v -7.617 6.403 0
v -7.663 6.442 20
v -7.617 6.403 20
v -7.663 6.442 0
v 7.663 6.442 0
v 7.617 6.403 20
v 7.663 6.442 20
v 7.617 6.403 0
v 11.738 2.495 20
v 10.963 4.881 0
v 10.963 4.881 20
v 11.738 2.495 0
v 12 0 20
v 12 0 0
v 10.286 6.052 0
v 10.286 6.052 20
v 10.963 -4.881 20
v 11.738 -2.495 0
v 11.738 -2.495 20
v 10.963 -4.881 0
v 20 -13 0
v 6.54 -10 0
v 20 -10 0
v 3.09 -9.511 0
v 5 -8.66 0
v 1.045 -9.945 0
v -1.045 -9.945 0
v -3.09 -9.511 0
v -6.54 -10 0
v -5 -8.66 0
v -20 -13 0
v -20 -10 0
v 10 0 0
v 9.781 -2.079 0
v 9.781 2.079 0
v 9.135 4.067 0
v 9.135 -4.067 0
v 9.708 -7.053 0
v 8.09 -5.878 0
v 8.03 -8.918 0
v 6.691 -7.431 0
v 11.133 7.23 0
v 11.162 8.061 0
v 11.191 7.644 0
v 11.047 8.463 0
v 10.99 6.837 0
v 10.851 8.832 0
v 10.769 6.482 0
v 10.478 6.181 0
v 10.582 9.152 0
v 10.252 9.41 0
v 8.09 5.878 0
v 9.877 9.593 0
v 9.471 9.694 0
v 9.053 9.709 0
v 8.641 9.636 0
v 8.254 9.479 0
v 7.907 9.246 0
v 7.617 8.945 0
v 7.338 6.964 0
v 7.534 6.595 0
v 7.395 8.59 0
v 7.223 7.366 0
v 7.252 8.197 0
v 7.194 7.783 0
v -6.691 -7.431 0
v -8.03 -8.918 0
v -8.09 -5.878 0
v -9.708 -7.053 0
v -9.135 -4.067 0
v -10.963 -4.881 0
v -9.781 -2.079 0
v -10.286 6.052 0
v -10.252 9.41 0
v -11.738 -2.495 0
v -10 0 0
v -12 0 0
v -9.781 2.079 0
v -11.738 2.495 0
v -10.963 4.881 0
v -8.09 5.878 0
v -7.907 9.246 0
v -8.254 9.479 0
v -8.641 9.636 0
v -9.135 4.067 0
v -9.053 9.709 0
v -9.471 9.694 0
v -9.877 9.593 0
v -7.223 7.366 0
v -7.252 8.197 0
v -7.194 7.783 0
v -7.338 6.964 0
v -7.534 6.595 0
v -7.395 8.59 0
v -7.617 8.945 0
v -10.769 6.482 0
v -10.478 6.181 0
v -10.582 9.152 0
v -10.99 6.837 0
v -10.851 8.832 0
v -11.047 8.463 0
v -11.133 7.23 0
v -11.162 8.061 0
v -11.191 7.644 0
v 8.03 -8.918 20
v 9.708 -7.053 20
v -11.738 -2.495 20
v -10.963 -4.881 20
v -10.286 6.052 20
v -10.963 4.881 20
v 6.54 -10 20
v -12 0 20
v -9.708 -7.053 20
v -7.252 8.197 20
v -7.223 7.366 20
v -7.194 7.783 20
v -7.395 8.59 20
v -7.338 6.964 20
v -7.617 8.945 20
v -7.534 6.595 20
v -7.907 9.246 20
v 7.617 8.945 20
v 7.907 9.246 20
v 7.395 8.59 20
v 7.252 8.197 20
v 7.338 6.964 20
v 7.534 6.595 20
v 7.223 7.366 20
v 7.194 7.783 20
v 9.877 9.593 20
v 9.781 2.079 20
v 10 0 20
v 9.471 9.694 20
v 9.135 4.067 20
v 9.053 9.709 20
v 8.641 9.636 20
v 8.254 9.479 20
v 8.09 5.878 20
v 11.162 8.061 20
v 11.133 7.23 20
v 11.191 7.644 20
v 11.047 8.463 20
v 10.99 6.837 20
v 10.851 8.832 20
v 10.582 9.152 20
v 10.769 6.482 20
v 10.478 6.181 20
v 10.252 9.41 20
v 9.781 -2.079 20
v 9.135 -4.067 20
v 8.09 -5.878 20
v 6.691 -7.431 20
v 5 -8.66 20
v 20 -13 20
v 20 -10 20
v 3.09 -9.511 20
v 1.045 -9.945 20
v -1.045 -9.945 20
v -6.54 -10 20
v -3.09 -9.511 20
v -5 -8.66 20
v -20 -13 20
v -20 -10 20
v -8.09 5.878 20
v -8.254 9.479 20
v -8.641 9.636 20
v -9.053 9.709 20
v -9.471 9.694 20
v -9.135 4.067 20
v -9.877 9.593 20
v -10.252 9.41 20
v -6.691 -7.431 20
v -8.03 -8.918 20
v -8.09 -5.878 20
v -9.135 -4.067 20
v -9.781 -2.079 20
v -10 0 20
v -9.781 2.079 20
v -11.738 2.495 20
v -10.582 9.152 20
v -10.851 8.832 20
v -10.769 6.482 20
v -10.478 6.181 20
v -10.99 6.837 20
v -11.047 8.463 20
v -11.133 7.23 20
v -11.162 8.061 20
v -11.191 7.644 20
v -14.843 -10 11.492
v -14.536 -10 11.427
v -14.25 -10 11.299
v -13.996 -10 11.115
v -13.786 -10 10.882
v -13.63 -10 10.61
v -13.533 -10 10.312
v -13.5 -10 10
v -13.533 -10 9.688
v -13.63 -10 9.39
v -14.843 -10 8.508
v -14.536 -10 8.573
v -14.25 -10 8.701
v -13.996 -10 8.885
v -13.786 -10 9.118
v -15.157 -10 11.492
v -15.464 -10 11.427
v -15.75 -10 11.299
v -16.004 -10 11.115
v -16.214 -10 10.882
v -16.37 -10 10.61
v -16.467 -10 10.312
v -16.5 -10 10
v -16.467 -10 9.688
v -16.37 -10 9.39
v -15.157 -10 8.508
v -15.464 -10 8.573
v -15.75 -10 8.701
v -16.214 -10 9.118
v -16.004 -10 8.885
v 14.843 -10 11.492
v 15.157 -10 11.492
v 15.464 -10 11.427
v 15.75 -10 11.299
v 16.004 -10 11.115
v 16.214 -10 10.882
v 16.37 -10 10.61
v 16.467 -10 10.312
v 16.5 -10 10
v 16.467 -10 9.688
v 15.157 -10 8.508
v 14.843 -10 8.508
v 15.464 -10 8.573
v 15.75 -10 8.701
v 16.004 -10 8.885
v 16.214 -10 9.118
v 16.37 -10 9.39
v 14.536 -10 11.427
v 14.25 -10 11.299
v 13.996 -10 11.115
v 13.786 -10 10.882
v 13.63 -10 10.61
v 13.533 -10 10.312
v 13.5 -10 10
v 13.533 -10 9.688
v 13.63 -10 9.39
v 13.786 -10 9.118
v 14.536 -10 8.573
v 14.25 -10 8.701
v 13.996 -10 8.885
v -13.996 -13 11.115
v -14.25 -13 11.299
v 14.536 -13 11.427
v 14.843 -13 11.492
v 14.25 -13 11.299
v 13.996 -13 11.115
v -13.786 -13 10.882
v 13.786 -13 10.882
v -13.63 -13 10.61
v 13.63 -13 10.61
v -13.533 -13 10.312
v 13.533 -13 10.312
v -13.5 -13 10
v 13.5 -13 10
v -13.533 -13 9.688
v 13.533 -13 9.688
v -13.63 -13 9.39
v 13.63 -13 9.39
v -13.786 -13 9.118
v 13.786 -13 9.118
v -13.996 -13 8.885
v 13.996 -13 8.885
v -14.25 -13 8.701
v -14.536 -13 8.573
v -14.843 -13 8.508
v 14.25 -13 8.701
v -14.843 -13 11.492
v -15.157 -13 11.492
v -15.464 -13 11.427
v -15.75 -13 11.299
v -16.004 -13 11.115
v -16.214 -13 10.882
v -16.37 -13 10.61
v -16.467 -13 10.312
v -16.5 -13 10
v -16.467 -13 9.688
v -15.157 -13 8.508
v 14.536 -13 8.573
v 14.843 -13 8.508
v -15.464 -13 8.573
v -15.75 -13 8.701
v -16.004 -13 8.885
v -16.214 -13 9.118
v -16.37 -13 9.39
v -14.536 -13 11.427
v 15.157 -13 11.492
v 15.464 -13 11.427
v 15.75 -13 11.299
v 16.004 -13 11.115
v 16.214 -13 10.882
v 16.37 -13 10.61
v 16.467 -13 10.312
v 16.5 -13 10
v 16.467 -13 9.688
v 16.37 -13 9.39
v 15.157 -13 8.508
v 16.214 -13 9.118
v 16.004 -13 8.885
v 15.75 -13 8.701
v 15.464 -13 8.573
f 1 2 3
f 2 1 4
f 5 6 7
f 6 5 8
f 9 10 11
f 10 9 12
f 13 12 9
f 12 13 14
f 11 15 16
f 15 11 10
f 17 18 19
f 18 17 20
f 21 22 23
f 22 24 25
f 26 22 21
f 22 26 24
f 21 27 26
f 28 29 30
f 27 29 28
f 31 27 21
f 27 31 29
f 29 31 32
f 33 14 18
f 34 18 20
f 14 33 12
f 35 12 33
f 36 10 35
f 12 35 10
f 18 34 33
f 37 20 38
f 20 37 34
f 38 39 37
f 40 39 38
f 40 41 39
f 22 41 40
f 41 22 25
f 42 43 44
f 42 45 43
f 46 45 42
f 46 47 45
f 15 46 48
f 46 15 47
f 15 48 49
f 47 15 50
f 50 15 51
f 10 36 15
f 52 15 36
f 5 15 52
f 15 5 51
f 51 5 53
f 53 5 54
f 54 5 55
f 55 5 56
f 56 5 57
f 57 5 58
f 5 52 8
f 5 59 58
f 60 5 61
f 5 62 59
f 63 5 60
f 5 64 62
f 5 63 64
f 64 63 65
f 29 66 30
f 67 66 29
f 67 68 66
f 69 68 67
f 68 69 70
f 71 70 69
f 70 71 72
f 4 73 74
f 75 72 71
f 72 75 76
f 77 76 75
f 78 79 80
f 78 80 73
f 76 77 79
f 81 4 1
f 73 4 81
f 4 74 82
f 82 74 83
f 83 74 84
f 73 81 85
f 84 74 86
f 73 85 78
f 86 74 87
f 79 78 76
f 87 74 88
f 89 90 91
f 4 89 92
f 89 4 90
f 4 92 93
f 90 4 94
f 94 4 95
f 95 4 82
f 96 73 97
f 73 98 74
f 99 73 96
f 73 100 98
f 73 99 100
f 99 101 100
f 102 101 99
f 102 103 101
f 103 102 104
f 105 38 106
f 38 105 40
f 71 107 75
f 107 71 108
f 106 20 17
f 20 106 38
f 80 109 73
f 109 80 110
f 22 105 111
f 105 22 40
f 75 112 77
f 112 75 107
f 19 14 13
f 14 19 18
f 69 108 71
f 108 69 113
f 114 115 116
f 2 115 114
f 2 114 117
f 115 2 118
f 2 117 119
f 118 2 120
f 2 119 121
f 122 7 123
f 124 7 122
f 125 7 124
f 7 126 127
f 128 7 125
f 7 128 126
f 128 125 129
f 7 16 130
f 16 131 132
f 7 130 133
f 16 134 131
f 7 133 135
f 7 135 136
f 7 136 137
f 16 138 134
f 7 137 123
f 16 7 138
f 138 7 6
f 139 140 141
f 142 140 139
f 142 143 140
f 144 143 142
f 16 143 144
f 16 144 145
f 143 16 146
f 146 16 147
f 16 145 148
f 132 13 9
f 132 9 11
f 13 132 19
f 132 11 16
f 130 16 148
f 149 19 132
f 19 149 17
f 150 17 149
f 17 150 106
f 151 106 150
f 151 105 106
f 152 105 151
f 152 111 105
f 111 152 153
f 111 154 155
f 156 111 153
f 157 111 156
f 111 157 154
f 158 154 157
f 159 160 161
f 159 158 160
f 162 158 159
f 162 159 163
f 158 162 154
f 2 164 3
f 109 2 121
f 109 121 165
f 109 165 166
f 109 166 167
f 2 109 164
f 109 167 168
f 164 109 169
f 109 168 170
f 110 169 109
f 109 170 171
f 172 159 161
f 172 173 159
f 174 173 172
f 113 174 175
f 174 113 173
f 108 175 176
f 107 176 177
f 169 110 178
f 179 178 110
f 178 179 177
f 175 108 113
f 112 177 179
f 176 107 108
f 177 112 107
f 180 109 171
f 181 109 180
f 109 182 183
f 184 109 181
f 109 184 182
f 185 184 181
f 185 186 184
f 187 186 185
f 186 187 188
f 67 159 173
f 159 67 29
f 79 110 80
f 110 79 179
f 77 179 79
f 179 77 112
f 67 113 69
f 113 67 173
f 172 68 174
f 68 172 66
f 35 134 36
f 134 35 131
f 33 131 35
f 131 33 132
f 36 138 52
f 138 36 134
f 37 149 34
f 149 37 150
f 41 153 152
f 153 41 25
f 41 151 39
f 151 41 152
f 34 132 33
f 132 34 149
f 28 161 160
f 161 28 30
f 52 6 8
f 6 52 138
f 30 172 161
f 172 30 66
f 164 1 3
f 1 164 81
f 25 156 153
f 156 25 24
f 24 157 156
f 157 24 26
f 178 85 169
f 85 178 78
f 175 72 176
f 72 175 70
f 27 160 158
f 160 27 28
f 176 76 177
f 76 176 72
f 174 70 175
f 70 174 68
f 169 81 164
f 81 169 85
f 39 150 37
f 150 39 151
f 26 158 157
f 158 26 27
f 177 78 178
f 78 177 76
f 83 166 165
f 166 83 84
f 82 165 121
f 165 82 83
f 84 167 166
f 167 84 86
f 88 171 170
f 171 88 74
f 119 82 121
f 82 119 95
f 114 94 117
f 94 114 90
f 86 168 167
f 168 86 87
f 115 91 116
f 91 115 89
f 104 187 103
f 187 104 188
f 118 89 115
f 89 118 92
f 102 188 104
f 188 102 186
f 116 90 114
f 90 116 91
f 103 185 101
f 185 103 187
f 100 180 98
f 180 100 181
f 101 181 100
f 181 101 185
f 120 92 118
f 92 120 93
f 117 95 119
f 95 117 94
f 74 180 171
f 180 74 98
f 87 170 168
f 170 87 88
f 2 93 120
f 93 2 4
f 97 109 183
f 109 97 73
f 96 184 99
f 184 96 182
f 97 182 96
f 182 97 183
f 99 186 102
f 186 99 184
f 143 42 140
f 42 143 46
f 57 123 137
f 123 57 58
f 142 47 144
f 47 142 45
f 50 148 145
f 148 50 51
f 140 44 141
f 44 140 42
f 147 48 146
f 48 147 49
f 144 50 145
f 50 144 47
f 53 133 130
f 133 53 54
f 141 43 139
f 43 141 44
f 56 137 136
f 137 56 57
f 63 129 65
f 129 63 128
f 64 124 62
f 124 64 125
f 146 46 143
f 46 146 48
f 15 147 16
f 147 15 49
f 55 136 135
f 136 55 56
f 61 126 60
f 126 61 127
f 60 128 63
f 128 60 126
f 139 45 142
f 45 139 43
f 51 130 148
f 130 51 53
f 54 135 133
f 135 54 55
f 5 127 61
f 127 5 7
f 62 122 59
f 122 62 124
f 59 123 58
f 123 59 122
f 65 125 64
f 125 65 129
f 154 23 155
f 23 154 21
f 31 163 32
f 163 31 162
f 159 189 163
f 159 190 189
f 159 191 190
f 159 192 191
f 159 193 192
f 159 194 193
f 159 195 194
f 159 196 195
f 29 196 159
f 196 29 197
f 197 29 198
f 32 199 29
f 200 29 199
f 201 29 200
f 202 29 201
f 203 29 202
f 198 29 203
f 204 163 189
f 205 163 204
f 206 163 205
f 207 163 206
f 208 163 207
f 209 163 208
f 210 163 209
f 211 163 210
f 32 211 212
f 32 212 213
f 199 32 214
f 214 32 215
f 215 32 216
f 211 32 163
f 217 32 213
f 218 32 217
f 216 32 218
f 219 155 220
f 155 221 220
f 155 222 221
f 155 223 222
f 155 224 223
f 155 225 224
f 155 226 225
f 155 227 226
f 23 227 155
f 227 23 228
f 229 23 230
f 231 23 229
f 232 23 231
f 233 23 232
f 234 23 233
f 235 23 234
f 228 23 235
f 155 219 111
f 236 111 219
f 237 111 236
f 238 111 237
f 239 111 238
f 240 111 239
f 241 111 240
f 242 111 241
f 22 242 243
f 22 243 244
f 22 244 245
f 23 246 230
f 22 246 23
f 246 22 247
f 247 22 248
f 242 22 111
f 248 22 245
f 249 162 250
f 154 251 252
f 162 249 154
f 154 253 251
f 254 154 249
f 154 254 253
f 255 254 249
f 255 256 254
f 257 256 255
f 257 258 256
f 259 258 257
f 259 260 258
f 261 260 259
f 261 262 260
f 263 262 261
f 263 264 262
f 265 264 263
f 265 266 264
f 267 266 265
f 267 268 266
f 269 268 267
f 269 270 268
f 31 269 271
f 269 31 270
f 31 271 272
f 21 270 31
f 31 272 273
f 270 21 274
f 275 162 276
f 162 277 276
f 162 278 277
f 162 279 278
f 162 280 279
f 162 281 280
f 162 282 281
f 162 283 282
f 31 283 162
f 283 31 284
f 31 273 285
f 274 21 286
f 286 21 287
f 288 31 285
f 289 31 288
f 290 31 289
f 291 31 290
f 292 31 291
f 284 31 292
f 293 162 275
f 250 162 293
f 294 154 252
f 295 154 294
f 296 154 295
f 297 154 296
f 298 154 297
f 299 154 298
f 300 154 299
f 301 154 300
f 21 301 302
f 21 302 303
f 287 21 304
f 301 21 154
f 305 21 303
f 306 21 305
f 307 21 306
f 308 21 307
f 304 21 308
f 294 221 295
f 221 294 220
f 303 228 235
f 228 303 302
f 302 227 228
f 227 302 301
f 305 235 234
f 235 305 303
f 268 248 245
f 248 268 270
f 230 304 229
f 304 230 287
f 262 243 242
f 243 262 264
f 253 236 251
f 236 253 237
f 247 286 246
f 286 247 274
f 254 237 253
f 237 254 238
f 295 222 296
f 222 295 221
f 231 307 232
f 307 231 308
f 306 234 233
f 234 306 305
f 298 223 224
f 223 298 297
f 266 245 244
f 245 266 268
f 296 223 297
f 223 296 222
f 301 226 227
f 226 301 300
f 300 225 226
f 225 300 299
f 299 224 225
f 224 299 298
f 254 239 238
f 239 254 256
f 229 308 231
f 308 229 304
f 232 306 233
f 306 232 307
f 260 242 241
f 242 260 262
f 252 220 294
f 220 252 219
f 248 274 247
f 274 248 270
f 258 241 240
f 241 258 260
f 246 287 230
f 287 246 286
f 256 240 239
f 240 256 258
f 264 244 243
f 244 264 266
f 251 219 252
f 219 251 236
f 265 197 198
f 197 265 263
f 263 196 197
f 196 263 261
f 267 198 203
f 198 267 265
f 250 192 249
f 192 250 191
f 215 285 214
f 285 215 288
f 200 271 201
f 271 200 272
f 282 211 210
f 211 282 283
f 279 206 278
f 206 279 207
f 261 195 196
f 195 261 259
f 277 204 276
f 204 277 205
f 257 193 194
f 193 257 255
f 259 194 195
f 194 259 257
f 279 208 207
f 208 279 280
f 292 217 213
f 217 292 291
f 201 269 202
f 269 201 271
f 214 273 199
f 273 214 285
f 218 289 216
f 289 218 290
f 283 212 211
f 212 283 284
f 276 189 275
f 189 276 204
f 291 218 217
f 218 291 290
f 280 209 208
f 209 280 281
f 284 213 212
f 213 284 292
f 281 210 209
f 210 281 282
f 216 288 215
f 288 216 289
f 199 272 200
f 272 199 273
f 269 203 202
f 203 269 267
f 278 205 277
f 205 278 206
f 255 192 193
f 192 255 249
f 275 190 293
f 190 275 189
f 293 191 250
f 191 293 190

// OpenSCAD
// [FL_INDEX: keywords="openscad, 3d_parametric, Customizable_Round_Clip, csg_solid" | COT="Parametric OpenSCAD design from 3DCodeverse"]
// Title: Customizable Round Clip

// Parametric Round Clip Holder
// Generates an adjustable set of round clips with mounting ears
// Garrett Mace April 7th 2011
// moded for makerbot custiomizer by jhack 25/3/2013


// Parameters
// Number of clips on the bracket
clipNumber = 1;		//[1:50]		
// Distance between clip centers
clipSpacing = 30;	//[1:100]	
// Diameter of the clip inside face		
clipInnerDiameter = 20;//[5:100]
// Width (height) of clip
clipWidth = 20;		//[5:100]		
// Thickness of clip walls
clipWallThickness = 2;	//[2:10]
// Amount of clip ring to remove from top (valid between 0 and 180)
clipOpeningAngle = 100;//[0:180]	
	
// Thickness of mounting bracket
bracketThickness = 3;	//[2:10]	
// Length of mounting ears from center of first and last clips
mountEarsLength = 20;	//[5:100]		
// Position of mounting holes from edge of mounting ears
mountHoleOffset = 5;	//[2:10]		
// Diameter of the mounting holes
mountHoleDiameter = 3;	 //[1:10]	

/* [hidden] */
$fs = 0.25;

// Round clip
module roundClip() {
difference() {
	cylinder(r = (clipInnerDiameter/2 + clipWallThickness), h = clipWidth);
	translate([0,0,-1]) cylinder(r = clipInnerDiameter/2, h = clipWidth + 2);
	translate([0,0,-1]) union () {
		rotate([0,0,clipOpeningAngle/4-0.05]) intersection() {
			rotate([0,0,clipOpeningAngle/4]) cube([clipInnerDiameter+clipWallThickness+1,clipInnerDiameter+clipWallThickness+1,clipWidth+2]);
			rotate ([0,0,-clipOpeningAngle/4]) translate([-(clipInnerDiameter+clipWallThickness+1),0,0]) cube([clipInnerDiameter+clipWallThickness+1,clipInnerDiameter+clipWallThickness+1,clipWidth+2]);
			cylinder(r=clipInnerDiameter+clipWallThickness+1,h=clipWidth+2);
		}

		rotate([0,0,-clipOpeningAngle/4+0.05]) intersection() {
			rotate([0,0,clipOpeningAngle/4]) cube([clipInnerDiameter+clipWallThickness+1,clipInnerDiameter+clipWallThickness+1,clipWidth+2]);
			rotate ([0,0,-clipOpeningAngle/4]) translate([-(clipInnerDiameter+clipWallThickness+1),0,0]) cube([clipInnerDiameter+clipWallThickness+1,clipInnerDiameter+clipWallThickness+1,clipWidth+2]);
			cylinder(r=clipInnerDiameter+clipWallThickness+1,h=clipWidth+2);
		}
	}
}

rotate([0,0,clipOpeningAngle/2]) translate([0,clipInnerDiameter/2+clipWallThickness,0]) cylinder(r = clipWallThickness, h = clipWidth);
//#rotate([0,0,clipOpeningAngle/2]) translate([0,clipInnerDiameter/2+clipWallThickness*2,0]) cylinder(r = clipWallThickness, h = clipWidth);

rotate([0,0,-clipOpeningAngle/2]) translate([0,clipInnerDiameter/2+clipWallThickness,0]) cylinder(r = clipWallThickness, h = clipWidth);
}

// Create clips
translate([-(clipSpacing*(clipNumber-1))/2,0,0]) for (clipPos = [0:clipNumber-1]) {
	translate([clipPos*clipSpacing,0,0]) roundClip();
}

// Calculations
calcs_bracketLength = clipSpacing*(clipNumber-1)+mountEarsLength*2;

// Mounting bracket and holes
difference() {
	translate([-calcs_bracketLength/2,-clipInnerDiameter/2-bracketThickness,0]) cube([calcs_bracketLength,bracketThickness,clipWidth]);
	translate([calcs_bracketLength/2-mountHoleOffset,-clipInnerDiameter/2-bracketThickness-1,clipWidth/2]) rotate([-90,0,0]) cylinder(r = mountHoleDiameter/2, h = bracketThickness+2);
	translate([-calcs_bracketLength/2+mountHoleOffset,-clipInnerDiameter/2-bracketThickness-1,clipWidth/2]) rotate([-90,0,0]) cylinder(r = mountHoleDiameter/2, h = bracketThickness+2);

}
